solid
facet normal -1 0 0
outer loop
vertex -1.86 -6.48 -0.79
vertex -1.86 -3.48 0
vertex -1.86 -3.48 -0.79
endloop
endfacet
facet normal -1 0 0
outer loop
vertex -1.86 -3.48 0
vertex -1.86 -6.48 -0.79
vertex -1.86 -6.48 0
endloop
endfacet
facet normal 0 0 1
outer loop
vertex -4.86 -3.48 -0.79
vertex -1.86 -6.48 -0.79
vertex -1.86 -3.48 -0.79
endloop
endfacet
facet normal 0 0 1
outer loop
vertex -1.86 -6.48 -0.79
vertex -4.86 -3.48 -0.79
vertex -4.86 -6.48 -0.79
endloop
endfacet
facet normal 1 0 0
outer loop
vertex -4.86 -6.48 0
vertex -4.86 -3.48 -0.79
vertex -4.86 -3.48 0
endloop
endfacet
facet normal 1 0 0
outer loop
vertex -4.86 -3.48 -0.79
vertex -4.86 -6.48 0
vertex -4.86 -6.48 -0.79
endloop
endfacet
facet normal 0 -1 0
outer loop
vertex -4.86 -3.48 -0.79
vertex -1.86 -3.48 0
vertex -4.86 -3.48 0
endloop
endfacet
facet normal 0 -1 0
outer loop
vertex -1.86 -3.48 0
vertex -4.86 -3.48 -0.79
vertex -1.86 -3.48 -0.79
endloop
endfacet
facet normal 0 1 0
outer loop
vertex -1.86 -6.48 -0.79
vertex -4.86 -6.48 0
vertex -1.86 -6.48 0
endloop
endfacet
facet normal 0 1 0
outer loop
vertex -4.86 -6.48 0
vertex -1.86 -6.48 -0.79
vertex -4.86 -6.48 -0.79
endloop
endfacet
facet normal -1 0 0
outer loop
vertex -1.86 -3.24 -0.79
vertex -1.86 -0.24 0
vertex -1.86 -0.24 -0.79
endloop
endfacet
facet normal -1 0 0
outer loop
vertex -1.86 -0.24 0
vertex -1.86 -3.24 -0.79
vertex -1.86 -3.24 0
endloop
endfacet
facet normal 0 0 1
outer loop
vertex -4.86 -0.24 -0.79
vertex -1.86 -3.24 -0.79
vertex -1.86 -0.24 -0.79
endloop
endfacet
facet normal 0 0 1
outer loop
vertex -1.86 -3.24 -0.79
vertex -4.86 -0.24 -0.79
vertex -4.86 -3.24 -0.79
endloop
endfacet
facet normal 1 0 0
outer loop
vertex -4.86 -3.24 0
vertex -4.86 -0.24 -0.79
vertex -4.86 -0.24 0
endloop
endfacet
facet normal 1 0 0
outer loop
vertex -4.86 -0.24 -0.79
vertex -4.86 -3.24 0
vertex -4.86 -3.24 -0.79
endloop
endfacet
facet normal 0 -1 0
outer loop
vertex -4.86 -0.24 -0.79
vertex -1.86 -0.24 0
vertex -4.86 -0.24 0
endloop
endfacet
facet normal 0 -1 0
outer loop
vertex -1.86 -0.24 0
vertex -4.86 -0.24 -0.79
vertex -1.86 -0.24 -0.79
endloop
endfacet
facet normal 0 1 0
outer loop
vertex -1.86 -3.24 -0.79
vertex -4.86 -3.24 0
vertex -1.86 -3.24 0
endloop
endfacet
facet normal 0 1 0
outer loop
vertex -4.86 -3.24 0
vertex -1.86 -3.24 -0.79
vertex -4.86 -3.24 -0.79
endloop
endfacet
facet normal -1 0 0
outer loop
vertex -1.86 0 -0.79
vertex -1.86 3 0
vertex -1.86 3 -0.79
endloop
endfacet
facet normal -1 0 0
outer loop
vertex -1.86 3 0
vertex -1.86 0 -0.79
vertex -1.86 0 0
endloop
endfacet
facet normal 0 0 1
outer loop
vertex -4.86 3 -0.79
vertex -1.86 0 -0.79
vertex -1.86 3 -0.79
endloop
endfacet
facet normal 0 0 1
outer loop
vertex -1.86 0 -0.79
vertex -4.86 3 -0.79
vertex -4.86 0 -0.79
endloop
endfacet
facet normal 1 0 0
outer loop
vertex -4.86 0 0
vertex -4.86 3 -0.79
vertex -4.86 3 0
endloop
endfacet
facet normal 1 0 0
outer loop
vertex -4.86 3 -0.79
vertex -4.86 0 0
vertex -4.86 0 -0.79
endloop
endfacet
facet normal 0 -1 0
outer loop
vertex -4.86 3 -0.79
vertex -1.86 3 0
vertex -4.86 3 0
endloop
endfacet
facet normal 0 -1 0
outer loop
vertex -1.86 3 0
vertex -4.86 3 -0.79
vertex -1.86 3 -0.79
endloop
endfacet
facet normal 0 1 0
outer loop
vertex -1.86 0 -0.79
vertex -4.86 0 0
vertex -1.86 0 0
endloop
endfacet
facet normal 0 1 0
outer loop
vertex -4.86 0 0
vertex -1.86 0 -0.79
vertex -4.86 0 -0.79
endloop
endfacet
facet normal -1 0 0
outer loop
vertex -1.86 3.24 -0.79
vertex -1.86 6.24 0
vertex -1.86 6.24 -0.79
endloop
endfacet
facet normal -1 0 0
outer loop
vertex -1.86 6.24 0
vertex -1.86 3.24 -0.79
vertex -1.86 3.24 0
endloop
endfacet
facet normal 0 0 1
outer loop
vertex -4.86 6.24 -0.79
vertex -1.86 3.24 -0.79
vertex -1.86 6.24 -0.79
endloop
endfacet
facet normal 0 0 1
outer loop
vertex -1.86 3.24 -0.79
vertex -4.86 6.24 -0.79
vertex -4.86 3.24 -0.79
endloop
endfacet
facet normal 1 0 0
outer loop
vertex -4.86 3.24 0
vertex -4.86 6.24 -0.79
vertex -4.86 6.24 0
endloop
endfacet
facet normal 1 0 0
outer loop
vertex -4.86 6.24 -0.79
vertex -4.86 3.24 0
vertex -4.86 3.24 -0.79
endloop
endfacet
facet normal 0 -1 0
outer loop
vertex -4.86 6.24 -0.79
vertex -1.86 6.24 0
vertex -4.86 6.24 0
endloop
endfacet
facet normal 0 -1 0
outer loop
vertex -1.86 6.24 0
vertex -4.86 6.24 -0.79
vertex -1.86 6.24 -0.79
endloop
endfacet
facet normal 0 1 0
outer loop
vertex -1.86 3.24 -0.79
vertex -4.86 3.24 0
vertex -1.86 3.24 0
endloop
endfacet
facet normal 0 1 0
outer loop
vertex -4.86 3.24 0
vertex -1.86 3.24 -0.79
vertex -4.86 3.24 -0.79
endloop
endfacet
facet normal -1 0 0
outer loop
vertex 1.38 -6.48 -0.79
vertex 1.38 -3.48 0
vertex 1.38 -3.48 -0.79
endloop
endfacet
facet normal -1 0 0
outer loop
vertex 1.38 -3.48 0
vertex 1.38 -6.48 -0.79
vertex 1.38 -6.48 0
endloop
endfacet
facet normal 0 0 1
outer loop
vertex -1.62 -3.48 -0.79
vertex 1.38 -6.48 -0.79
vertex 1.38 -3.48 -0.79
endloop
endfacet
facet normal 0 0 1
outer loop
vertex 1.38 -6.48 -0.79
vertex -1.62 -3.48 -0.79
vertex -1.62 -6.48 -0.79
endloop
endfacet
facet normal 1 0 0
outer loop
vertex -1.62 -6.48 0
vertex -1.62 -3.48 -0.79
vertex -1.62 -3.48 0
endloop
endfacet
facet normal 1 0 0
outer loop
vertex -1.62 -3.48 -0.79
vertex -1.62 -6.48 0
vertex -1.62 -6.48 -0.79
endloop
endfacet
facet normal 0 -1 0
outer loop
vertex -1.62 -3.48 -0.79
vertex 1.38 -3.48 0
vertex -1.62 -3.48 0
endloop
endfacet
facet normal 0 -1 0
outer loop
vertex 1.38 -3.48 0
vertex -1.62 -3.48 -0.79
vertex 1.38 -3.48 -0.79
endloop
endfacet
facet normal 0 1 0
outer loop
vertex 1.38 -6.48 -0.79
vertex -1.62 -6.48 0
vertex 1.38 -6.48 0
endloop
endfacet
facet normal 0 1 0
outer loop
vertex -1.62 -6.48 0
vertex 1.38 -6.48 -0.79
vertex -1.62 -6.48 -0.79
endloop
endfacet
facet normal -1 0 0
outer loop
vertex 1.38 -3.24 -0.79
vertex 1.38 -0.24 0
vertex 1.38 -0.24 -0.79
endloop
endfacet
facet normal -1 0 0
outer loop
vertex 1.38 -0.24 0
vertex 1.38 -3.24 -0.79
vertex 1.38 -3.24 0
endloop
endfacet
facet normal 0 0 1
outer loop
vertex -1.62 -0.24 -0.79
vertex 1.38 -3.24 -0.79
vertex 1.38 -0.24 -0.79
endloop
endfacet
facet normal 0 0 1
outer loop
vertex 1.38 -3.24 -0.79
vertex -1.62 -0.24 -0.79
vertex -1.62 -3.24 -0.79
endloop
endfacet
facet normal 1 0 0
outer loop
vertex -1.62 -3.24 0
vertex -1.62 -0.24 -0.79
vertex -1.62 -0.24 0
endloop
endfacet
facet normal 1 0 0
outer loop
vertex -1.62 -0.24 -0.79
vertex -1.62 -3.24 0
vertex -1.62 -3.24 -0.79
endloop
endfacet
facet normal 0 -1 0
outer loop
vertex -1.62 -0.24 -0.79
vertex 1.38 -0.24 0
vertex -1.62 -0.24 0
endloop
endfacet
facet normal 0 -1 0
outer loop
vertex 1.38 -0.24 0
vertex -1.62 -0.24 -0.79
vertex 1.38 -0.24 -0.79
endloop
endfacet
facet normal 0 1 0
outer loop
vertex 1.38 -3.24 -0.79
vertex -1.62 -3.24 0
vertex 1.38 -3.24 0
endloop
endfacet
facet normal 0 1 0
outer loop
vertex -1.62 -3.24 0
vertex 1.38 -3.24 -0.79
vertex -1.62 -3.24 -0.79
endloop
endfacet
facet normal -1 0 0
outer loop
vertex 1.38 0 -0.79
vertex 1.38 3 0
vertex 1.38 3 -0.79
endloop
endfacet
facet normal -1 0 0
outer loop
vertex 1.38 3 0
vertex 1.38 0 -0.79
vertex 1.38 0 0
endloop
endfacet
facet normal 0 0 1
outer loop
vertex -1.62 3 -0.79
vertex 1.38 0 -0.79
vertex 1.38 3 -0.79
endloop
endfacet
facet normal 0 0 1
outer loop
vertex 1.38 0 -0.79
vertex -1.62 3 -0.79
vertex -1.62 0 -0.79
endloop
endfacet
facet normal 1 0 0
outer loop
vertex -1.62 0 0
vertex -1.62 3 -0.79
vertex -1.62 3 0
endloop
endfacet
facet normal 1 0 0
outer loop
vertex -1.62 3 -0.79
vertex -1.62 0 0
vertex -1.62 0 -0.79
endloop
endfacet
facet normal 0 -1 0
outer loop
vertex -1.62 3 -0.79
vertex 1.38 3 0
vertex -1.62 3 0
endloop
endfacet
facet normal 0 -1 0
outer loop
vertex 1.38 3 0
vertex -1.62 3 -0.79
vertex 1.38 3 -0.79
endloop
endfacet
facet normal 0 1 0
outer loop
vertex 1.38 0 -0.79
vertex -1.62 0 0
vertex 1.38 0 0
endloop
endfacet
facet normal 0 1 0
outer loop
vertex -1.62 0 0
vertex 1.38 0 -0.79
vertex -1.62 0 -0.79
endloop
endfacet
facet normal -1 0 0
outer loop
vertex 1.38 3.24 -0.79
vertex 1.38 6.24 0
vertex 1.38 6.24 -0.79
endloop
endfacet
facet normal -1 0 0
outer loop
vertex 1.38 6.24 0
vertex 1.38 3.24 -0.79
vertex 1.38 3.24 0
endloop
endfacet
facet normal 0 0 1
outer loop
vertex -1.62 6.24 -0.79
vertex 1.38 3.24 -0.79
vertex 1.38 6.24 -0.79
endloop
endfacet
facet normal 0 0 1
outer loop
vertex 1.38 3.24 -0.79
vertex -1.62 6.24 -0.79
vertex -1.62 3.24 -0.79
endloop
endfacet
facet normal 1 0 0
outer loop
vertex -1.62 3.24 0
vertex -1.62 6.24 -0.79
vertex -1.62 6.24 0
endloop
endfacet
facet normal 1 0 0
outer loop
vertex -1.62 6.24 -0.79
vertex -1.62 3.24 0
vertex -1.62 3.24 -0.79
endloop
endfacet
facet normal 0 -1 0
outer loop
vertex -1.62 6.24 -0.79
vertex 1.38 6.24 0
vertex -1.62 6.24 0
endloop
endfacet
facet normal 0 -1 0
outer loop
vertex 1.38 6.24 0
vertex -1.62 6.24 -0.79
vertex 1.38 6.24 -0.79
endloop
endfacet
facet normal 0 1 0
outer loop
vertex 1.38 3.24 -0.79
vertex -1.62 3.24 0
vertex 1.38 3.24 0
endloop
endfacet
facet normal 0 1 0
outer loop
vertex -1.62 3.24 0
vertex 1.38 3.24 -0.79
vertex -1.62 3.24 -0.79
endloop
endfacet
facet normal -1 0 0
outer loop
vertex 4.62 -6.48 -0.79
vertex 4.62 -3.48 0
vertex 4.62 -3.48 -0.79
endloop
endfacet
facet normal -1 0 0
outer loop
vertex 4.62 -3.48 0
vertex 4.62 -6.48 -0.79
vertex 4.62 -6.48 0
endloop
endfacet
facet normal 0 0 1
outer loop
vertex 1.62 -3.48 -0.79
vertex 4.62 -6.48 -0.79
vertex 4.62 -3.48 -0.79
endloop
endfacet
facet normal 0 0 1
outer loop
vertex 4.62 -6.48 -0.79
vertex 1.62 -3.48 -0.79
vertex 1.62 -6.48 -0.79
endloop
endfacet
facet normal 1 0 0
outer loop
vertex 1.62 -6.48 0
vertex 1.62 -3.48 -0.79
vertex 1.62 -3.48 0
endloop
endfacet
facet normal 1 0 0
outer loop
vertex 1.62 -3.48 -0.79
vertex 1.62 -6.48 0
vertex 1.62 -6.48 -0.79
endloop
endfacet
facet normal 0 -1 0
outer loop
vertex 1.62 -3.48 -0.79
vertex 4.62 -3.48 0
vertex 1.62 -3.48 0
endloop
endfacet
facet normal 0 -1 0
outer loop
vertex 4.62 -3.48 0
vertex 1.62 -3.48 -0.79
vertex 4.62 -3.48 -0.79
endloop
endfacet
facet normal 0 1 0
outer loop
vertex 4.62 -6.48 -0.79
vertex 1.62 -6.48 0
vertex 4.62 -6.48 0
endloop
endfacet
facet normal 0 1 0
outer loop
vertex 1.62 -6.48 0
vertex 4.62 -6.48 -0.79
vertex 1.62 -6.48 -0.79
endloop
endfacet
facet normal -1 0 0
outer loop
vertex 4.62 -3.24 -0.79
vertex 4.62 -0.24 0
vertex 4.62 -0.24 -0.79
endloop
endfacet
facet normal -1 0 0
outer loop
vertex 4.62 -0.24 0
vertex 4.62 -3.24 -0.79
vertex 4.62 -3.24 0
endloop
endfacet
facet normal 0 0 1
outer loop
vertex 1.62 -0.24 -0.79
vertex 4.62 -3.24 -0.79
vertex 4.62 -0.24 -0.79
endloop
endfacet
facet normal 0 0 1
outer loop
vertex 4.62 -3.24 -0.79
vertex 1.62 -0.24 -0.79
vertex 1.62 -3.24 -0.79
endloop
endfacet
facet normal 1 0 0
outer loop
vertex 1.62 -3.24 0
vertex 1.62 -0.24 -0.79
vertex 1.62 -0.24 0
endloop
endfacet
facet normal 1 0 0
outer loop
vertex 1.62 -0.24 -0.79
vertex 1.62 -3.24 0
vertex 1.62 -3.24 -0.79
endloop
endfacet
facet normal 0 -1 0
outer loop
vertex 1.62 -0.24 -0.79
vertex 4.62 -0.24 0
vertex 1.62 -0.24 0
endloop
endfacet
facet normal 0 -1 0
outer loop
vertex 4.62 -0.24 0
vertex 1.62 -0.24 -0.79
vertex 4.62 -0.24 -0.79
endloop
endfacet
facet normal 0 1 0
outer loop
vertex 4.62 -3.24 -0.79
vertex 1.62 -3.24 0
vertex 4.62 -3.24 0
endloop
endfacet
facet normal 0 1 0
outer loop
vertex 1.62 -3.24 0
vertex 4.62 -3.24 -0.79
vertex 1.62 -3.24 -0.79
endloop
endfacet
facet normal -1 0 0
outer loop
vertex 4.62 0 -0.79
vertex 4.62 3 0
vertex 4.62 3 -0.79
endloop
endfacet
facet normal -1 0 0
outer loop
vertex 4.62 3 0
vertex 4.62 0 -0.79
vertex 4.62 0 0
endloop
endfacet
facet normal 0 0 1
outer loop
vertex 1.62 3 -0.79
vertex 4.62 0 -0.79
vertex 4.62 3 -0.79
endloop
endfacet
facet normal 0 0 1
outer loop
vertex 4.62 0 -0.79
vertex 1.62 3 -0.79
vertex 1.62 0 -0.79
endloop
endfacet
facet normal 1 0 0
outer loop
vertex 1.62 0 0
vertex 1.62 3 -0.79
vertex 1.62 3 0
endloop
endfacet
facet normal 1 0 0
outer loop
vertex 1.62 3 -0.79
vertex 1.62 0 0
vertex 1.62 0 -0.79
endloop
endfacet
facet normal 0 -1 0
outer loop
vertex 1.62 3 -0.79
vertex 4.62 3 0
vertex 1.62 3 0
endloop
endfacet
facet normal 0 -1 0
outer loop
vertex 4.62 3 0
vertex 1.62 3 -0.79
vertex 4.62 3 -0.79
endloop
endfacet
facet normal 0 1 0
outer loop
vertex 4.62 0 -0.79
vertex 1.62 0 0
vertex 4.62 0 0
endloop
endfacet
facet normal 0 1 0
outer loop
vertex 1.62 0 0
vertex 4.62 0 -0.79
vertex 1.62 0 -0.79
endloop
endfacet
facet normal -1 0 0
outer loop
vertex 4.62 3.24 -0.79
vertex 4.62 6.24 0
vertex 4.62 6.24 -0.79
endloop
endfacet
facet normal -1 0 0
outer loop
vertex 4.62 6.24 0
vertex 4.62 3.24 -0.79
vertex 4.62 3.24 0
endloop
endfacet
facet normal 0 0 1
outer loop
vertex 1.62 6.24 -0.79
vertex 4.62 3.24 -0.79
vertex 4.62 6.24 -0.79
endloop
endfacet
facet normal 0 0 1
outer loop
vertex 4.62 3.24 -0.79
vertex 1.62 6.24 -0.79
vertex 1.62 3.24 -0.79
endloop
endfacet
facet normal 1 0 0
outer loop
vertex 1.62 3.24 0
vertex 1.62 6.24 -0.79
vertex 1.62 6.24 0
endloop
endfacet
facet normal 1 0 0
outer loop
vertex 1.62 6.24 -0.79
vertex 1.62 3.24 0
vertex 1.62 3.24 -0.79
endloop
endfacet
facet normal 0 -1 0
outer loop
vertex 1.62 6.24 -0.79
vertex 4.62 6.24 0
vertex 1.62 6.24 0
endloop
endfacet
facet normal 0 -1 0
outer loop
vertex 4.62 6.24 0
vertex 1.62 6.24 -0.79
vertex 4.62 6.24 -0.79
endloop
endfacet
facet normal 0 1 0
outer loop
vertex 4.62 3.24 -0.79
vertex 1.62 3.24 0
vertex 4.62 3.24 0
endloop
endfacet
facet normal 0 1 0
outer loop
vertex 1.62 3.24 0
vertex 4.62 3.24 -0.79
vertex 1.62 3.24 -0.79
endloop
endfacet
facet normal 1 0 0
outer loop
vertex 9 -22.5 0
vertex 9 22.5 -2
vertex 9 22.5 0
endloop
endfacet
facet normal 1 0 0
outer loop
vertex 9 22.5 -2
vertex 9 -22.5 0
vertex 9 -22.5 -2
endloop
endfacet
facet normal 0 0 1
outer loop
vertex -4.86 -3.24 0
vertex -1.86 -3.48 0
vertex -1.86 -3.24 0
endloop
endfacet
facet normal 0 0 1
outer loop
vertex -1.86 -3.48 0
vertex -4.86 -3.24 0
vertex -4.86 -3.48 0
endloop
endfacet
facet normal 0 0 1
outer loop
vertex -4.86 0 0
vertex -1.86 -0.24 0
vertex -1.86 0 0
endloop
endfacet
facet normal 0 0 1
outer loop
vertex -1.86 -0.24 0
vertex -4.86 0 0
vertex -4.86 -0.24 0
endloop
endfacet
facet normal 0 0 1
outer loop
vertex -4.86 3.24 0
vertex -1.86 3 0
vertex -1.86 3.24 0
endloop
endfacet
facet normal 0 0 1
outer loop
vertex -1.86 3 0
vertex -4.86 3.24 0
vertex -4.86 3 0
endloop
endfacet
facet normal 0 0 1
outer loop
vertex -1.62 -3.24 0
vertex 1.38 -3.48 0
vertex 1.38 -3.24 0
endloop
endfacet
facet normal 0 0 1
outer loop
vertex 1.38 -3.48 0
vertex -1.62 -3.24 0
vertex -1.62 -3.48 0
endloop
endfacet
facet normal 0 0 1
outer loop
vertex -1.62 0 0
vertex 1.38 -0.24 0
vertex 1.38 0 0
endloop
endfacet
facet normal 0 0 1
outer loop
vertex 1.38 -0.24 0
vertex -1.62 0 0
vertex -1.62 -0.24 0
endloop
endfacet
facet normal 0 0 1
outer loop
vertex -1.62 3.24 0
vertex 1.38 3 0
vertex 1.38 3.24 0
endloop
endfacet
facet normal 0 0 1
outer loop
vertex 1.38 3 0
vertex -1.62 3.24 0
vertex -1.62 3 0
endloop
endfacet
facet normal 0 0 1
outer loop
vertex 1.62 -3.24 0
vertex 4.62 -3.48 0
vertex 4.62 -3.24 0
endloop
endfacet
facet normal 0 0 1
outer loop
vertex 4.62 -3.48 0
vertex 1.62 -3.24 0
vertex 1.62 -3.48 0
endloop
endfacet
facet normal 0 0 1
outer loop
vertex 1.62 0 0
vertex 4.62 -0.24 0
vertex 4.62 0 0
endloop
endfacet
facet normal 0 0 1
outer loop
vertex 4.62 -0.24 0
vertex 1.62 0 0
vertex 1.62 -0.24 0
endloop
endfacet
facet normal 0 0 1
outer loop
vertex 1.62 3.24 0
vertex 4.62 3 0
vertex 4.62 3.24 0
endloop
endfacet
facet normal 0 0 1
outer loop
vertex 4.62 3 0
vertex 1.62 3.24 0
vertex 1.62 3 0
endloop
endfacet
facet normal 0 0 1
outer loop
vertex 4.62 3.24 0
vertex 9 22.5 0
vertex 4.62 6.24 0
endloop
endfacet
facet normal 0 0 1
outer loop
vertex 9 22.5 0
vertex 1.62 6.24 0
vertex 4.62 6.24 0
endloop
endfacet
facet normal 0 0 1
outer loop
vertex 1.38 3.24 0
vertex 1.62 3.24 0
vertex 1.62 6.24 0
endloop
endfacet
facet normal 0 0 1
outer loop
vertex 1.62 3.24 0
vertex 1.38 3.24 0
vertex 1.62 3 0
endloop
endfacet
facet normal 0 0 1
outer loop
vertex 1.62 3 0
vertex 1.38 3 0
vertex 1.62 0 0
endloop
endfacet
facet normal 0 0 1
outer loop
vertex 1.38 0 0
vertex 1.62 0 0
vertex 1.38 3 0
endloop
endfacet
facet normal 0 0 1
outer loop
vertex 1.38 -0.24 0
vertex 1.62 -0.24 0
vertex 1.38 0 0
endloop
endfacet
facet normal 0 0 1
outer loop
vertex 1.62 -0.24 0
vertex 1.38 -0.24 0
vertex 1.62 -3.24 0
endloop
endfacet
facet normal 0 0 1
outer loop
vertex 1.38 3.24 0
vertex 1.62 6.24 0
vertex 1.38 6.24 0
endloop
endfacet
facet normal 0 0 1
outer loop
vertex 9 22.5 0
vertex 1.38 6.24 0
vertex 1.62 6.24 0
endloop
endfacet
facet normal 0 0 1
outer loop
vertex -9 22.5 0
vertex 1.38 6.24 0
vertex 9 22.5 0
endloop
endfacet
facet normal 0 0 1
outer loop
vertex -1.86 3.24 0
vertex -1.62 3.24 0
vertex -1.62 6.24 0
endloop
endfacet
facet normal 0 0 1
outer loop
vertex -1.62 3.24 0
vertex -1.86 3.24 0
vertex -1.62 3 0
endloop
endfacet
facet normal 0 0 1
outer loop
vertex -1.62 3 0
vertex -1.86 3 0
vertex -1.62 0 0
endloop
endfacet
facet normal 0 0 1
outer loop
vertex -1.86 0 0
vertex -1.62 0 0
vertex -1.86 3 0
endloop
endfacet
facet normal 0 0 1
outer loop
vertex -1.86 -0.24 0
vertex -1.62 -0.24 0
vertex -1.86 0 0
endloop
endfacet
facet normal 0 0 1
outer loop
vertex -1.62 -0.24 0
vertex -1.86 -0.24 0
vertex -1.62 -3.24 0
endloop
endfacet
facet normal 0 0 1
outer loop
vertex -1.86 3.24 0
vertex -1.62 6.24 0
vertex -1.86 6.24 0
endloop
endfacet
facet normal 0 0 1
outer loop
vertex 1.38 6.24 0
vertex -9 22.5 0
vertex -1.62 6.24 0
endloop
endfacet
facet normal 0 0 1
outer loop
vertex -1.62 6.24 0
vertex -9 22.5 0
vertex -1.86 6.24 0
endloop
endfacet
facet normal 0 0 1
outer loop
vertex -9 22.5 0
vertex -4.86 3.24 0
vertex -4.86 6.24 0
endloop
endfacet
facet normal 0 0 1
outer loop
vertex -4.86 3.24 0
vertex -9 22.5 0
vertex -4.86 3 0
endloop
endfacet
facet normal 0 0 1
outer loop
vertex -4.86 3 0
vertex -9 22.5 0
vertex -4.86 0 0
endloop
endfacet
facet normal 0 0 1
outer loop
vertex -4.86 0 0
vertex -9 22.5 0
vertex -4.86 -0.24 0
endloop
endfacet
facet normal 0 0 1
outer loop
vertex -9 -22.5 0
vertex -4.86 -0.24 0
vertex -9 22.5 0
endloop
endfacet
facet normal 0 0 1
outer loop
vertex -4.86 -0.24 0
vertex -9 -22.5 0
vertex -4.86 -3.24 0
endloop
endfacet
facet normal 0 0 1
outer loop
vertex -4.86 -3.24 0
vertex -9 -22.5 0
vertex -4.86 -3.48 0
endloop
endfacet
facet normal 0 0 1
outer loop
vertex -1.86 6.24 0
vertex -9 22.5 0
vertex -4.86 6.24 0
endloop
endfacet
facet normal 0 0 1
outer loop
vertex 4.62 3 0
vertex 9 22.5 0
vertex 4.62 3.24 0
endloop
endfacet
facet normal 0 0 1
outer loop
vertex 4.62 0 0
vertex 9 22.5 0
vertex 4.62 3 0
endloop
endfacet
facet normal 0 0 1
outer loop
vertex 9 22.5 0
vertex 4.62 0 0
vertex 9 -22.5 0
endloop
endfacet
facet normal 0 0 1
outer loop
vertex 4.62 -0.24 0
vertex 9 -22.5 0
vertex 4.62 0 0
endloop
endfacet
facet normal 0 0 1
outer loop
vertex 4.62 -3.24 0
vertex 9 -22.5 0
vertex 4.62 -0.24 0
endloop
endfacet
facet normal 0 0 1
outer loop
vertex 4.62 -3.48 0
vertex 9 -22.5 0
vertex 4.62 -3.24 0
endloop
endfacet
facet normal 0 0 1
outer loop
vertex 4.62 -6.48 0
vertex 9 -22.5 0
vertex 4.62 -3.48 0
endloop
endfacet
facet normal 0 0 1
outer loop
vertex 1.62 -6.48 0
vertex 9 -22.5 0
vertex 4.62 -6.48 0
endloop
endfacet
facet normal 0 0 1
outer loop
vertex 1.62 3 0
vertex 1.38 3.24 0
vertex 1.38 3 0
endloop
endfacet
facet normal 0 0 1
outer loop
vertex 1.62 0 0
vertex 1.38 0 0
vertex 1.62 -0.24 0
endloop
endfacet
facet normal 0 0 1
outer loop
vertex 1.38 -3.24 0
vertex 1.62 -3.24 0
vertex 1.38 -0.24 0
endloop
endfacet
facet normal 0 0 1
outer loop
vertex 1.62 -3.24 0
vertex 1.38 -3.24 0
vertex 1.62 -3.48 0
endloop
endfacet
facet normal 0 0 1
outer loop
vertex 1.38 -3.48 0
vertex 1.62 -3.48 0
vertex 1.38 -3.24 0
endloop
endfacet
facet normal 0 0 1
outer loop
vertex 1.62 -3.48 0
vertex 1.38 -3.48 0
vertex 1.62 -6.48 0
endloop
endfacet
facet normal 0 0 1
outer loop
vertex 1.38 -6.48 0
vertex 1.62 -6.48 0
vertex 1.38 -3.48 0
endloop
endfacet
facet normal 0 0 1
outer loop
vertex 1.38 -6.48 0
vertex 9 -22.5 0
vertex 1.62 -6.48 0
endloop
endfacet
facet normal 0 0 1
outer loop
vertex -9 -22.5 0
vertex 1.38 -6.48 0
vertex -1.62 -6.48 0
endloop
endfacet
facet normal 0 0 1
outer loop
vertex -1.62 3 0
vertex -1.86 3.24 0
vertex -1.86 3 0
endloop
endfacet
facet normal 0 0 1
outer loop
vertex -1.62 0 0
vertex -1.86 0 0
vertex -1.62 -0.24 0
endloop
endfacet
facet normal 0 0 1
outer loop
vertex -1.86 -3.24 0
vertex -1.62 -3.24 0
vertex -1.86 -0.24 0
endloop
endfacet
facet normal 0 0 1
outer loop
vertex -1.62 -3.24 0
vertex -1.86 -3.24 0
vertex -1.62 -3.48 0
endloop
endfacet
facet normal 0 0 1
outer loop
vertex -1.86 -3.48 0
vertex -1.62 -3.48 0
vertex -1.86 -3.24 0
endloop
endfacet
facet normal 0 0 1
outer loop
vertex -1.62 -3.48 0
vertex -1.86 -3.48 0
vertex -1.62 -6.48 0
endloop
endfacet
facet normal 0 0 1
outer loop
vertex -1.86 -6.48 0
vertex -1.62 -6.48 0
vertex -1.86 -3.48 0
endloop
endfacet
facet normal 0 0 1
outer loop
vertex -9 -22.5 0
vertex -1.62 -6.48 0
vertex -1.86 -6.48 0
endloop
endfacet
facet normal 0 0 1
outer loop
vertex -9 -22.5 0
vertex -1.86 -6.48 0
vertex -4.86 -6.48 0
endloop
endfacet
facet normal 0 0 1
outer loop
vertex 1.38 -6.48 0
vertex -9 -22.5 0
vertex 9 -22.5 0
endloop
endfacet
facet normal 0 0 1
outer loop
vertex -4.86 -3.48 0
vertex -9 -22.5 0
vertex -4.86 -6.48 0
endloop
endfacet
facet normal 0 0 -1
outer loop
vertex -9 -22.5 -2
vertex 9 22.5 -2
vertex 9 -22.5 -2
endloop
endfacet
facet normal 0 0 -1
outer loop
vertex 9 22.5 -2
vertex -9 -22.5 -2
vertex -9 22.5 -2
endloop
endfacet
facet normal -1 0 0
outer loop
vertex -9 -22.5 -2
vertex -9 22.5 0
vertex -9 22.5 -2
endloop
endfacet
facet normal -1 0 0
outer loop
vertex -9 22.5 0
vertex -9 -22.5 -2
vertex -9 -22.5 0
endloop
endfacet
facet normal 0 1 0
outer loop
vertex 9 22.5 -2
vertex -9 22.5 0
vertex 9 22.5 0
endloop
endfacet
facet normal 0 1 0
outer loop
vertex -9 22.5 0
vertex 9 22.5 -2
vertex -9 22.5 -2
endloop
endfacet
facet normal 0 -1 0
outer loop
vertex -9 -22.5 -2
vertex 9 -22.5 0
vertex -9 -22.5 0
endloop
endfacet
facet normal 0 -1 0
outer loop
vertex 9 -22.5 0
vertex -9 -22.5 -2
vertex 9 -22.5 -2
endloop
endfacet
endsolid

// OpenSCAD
//oocyte chamber
//updated by AM Chagas 20210506 -> larger grid
//designed by AM Chagas 20181001 CC BY 4.0 license
//inspired on the design from J Menzies.

wellx = 3;
welly = 3;
wellz = 0.8;
interwell = 0.24;
nwellsx = 3;
nwellsy = 4;

platey = wellx*nwellsx*5;
platex = welly*nwellsy*1.5    ;
platez = 2;


module grid(){
    for (x = [0:nwellsx-1]){
        for (y = [0:nwellsy-1]){
            translate([x*(wellx+interwell),y*(welly+interwell),0]){
                cube([wellx,welly,wellz]);
                }//end translate
            }//end for y
    }//end for x
}//end module

difference(){
translate([0,0,-platez/2]){
cube([platex,platey,platez],center=true);
}//end translate
translate([-(nwellsx*(wellx+interwell))/2,-(nwellsy*(welly+interwell))/2,-wellz+0.01]){
grid();
}//end translate
}//end difference
